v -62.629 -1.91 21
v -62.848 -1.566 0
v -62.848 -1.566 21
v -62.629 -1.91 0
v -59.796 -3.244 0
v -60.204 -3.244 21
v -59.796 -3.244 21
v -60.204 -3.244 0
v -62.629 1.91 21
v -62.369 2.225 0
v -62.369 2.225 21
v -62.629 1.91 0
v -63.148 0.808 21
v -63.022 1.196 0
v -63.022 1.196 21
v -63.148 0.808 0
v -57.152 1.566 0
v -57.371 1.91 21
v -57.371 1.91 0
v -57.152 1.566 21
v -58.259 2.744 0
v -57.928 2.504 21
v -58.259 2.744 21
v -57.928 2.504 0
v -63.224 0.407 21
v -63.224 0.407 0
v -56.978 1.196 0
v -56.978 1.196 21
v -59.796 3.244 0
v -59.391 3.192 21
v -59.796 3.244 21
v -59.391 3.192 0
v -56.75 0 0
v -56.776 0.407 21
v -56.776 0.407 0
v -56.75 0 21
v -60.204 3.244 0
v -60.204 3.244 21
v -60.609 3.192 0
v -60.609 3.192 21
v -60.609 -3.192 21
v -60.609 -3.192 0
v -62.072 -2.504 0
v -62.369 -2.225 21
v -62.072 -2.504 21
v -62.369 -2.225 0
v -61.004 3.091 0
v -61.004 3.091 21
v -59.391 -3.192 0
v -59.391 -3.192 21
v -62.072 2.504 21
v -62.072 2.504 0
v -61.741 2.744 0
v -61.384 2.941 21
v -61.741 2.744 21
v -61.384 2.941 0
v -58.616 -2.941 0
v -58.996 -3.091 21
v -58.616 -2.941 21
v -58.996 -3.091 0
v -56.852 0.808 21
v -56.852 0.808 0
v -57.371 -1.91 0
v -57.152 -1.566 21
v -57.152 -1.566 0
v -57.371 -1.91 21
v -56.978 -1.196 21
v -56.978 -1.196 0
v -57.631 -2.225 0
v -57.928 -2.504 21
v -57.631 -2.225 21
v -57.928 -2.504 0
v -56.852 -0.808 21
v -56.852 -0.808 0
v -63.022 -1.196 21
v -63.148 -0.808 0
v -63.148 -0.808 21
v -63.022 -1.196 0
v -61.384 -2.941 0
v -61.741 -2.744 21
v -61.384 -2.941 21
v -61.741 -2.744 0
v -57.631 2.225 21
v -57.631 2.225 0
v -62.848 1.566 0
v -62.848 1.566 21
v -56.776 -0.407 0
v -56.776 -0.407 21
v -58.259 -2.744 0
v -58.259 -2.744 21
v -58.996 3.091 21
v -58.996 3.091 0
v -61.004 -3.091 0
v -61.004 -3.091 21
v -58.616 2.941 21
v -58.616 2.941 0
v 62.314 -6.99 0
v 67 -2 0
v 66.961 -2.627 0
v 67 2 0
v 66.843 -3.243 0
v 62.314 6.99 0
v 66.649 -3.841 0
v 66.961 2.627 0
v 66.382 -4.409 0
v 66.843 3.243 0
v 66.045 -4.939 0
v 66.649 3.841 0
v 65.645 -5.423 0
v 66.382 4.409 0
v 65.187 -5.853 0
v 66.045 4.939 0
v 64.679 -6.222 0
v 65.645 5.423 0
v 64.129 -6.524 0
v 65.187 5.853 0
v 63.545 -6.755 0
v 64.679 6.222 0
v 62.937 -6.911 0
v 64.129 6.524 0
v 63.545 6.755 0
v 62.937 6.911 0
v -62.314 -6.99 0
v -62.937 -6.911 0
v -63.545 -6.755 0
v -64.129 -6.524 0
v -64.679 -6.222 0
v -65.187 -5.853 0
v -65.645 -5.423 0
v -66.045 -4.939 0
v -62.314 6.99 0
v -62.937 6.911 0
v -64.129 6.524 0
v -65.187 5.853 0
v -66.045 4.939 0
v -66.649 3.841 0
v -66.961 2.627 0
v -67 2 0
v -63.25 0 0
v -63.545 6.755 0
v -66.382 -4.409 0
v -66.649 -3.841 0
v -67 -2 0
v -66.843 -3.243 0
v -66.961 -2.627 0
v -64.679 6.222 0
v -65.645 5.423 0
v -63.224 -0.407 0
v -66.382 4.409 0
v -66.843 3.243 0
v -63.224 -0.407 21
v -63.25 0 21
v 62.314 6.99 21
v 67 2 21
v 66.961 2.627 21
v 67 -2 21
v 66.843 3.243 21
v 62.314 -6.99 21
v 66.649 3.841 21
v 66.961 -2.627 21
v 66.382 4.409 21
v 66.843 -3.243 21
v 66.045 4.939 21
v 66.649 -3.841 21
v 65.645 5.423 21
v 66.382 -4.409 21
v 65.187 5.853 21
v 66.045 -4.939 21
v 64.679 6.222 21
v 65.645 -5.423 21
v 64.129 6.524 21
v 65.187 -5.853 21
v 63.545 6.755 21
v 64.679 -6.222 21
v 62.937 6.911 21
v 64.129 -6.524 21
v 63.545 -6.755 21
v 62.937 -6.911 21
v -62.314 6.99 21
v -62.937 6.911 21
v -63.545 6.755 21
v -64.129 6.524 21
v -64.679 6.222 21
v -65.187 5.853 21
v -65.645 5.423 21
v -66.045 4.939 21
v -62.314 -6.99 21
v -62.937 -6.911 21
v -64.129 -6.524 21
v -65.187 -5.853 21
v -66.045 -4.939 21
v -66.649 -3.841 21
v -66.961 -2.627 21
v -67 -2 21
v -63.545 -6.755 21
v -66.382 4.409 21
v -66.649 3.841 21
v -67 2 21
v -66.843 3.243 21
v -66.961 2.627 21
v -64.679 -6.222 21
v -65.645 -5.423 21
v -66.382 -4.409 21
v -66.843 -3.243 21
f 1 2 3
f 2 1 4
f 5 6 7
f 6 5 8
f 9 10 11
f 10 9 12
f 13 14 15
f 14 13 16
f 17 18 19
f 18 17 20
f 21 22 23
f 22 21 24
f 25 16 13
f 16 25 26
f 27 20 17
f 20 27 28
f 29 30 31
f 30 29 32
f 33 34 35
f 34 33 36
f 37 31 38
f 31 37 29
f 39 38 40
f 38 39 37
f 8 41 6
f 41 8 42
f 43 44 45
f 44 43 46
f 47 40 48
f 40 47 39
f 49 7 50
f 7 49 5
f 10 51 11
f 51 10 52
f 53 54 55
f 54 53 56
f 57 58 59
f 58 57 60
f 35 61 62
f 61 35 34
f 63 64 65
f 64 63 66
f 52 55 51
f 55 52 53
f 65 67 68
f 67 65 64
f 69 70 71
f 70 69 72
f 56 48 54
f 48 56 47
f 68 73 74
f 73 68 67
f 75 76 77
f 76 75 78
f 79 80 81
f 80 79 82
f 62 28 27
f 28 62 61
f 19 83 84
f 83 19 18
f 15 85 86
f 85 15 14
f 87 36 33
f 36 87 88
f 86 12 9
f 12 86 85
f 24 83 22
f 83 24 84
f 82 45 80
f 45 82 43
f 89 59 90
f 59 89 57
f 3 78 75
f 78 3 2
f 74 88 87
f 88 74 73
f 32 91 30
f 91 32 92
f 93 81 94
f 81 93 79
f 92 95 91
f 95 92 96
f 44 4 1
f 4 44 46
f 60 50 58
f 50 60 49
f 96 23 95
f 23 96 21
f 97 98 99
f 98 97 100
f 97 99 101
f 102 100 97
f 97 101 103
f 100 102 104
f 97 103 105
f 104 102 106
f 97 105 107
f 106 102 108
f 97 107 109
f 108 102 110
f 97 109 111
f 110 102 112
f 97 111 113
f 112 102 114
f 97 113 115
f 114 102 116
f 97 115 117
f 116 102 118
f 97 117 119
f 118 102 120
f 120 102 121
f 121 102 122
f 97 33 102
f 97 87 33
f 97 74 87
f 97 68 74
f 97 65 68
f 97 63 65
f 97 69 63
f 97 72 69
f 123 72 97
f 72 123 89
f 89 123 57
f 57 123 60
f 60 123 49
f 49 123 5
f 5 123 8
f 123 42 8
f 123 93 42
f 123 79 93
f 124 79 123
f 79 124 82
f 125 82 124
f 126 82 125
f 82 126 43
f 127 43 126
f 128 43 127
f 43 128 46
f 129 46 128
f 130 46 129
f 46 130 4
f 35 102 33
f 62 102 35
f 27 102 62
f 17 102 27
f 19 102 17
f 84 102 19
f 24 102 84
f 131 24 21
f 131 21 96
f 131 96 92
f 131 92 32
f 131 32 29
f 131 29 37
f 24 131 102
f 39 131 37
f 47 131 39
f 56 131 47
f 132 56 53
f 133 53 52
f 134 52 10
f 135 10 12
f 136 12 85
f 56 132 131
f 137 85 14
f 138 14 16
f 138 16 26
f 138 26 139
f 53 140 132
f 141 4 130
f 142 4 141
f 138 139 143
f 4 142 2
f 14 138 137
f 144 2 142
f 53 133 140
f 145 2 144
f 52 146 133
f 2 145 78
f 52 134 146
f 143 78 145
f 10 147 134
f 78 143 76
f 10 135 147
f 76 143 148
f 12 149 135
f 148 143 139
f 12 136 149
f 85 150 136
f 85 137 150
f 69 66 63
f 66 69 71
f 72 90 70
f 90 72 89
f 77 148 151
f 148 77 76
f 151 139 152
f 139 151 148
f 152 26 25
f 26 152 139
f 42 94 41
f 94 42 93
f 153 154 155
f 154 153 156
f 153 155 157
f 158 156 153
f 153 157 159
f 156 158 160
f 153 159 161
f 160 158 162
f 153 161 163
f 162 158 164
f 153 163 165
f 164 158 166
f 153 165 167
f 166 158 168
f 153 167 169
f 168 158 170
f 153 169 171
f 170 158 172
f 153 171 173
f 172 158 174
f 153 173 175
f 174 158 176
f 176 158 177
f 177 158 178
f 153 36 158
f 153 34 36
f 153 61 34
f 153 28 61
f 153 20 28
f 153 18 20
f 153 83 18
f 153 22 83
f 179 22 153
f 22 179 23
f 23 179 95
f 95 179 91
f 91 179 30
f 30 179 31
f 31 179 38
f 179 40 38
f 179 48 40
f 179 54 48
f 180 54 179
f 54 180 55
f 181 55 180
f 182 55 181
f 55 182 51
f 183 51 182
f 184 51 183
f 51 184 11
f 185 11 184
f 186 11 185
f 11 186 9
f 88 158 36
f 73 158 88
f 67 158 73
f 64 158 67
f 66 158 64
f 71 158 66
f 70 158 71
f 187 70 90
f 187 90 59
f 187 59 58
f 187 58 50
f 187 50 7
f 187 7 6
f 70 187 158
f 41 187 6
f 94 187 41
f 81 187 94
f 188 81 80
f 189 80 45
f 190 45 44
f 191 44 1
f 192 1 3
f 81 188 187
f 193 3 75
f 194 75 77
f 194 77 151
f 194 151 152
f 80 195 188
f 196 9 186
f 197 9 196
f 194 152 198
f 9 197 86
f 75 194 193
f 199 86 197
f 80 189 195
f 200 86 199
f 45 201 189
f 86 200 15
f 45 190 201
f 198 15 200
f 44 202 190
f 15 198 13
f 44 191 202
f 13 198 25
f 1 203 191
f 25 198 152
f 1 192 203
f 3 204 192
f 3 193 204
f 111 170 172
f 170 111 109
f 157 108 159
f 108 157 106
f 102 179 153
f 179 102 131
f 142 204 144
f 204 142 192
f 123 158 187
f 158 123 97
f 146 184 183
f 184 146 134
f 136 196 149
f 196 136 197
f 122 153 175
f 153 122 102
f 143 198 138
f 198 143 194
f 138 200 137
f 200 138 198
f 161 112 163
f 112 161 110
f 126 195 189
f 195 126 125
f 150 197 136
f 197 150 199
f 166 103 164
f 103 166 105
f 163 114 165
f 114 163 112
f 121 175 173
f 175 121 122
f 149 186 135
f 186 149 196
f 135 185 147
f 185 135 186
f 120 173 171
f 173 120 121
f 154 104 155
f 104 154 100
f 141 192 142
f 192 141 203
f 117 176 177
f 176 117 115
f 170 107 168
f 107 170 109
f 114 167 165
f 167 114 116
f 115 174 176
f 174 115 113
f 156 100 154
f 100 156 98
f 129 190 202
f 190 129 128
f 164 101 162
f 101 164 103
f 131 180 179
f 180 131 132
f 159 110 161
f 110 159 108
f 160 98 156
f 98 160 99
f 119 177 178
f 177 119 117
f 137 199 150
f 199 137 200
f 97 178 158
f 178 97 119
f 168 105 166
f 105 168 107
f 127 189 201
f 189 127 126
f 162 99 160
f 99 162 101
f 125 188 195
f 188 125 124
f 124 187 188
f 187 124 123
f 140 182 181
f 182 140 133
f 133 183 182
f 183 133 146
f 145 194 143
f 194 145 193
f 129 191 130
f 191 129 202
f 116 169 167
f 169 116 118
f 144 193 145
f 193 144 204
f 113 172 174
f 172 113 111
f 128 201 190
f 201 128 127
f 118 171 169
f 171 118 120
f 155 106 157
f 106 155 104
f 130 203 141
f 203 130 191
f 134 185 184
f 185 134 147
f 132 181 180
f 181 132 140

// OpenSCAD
$fn = 50;


difference() {
	union() {
		hull() {
			translate(v = [-62.0000000000, 2.0000000000, 0]) {
				cylinder(h = 21, r = 5);
			}
			translate(v = [62.0000000000, 2.0000000000, 0]) {
				cylinder(h = 21, r = 5);
			}
			translate(v = [-62.0000000000, -2.0000000000, 0]) {
				cylinder(h = 21, r = 5);
			}
			translate(v = [62.0000000000, -2.0000000000, 0]) {
				cylinder(h = 21, r = 5);
			}
		}
	}
	union() {
		translate(v = [-60.0000000000, 0.0000000000, 0]) {
			cylinder(h = 21, r = 3.2500000000);
		}
		translate(v = [-60.0000000000, 0.0000000000, 0]) {
			cylinder(h = 21, r = 1.8000000000);
		}
		translate(v = [-60.0000000000, 0.0000000000, 0]) {
			cylinder(h = 21, r = 1.8000000000);
		}
		translate(v = [-60.0000000000, 0.0000000000, 0]) {
			cylinder(h = 21, r = 1.8000000000);
		}
	}
}
